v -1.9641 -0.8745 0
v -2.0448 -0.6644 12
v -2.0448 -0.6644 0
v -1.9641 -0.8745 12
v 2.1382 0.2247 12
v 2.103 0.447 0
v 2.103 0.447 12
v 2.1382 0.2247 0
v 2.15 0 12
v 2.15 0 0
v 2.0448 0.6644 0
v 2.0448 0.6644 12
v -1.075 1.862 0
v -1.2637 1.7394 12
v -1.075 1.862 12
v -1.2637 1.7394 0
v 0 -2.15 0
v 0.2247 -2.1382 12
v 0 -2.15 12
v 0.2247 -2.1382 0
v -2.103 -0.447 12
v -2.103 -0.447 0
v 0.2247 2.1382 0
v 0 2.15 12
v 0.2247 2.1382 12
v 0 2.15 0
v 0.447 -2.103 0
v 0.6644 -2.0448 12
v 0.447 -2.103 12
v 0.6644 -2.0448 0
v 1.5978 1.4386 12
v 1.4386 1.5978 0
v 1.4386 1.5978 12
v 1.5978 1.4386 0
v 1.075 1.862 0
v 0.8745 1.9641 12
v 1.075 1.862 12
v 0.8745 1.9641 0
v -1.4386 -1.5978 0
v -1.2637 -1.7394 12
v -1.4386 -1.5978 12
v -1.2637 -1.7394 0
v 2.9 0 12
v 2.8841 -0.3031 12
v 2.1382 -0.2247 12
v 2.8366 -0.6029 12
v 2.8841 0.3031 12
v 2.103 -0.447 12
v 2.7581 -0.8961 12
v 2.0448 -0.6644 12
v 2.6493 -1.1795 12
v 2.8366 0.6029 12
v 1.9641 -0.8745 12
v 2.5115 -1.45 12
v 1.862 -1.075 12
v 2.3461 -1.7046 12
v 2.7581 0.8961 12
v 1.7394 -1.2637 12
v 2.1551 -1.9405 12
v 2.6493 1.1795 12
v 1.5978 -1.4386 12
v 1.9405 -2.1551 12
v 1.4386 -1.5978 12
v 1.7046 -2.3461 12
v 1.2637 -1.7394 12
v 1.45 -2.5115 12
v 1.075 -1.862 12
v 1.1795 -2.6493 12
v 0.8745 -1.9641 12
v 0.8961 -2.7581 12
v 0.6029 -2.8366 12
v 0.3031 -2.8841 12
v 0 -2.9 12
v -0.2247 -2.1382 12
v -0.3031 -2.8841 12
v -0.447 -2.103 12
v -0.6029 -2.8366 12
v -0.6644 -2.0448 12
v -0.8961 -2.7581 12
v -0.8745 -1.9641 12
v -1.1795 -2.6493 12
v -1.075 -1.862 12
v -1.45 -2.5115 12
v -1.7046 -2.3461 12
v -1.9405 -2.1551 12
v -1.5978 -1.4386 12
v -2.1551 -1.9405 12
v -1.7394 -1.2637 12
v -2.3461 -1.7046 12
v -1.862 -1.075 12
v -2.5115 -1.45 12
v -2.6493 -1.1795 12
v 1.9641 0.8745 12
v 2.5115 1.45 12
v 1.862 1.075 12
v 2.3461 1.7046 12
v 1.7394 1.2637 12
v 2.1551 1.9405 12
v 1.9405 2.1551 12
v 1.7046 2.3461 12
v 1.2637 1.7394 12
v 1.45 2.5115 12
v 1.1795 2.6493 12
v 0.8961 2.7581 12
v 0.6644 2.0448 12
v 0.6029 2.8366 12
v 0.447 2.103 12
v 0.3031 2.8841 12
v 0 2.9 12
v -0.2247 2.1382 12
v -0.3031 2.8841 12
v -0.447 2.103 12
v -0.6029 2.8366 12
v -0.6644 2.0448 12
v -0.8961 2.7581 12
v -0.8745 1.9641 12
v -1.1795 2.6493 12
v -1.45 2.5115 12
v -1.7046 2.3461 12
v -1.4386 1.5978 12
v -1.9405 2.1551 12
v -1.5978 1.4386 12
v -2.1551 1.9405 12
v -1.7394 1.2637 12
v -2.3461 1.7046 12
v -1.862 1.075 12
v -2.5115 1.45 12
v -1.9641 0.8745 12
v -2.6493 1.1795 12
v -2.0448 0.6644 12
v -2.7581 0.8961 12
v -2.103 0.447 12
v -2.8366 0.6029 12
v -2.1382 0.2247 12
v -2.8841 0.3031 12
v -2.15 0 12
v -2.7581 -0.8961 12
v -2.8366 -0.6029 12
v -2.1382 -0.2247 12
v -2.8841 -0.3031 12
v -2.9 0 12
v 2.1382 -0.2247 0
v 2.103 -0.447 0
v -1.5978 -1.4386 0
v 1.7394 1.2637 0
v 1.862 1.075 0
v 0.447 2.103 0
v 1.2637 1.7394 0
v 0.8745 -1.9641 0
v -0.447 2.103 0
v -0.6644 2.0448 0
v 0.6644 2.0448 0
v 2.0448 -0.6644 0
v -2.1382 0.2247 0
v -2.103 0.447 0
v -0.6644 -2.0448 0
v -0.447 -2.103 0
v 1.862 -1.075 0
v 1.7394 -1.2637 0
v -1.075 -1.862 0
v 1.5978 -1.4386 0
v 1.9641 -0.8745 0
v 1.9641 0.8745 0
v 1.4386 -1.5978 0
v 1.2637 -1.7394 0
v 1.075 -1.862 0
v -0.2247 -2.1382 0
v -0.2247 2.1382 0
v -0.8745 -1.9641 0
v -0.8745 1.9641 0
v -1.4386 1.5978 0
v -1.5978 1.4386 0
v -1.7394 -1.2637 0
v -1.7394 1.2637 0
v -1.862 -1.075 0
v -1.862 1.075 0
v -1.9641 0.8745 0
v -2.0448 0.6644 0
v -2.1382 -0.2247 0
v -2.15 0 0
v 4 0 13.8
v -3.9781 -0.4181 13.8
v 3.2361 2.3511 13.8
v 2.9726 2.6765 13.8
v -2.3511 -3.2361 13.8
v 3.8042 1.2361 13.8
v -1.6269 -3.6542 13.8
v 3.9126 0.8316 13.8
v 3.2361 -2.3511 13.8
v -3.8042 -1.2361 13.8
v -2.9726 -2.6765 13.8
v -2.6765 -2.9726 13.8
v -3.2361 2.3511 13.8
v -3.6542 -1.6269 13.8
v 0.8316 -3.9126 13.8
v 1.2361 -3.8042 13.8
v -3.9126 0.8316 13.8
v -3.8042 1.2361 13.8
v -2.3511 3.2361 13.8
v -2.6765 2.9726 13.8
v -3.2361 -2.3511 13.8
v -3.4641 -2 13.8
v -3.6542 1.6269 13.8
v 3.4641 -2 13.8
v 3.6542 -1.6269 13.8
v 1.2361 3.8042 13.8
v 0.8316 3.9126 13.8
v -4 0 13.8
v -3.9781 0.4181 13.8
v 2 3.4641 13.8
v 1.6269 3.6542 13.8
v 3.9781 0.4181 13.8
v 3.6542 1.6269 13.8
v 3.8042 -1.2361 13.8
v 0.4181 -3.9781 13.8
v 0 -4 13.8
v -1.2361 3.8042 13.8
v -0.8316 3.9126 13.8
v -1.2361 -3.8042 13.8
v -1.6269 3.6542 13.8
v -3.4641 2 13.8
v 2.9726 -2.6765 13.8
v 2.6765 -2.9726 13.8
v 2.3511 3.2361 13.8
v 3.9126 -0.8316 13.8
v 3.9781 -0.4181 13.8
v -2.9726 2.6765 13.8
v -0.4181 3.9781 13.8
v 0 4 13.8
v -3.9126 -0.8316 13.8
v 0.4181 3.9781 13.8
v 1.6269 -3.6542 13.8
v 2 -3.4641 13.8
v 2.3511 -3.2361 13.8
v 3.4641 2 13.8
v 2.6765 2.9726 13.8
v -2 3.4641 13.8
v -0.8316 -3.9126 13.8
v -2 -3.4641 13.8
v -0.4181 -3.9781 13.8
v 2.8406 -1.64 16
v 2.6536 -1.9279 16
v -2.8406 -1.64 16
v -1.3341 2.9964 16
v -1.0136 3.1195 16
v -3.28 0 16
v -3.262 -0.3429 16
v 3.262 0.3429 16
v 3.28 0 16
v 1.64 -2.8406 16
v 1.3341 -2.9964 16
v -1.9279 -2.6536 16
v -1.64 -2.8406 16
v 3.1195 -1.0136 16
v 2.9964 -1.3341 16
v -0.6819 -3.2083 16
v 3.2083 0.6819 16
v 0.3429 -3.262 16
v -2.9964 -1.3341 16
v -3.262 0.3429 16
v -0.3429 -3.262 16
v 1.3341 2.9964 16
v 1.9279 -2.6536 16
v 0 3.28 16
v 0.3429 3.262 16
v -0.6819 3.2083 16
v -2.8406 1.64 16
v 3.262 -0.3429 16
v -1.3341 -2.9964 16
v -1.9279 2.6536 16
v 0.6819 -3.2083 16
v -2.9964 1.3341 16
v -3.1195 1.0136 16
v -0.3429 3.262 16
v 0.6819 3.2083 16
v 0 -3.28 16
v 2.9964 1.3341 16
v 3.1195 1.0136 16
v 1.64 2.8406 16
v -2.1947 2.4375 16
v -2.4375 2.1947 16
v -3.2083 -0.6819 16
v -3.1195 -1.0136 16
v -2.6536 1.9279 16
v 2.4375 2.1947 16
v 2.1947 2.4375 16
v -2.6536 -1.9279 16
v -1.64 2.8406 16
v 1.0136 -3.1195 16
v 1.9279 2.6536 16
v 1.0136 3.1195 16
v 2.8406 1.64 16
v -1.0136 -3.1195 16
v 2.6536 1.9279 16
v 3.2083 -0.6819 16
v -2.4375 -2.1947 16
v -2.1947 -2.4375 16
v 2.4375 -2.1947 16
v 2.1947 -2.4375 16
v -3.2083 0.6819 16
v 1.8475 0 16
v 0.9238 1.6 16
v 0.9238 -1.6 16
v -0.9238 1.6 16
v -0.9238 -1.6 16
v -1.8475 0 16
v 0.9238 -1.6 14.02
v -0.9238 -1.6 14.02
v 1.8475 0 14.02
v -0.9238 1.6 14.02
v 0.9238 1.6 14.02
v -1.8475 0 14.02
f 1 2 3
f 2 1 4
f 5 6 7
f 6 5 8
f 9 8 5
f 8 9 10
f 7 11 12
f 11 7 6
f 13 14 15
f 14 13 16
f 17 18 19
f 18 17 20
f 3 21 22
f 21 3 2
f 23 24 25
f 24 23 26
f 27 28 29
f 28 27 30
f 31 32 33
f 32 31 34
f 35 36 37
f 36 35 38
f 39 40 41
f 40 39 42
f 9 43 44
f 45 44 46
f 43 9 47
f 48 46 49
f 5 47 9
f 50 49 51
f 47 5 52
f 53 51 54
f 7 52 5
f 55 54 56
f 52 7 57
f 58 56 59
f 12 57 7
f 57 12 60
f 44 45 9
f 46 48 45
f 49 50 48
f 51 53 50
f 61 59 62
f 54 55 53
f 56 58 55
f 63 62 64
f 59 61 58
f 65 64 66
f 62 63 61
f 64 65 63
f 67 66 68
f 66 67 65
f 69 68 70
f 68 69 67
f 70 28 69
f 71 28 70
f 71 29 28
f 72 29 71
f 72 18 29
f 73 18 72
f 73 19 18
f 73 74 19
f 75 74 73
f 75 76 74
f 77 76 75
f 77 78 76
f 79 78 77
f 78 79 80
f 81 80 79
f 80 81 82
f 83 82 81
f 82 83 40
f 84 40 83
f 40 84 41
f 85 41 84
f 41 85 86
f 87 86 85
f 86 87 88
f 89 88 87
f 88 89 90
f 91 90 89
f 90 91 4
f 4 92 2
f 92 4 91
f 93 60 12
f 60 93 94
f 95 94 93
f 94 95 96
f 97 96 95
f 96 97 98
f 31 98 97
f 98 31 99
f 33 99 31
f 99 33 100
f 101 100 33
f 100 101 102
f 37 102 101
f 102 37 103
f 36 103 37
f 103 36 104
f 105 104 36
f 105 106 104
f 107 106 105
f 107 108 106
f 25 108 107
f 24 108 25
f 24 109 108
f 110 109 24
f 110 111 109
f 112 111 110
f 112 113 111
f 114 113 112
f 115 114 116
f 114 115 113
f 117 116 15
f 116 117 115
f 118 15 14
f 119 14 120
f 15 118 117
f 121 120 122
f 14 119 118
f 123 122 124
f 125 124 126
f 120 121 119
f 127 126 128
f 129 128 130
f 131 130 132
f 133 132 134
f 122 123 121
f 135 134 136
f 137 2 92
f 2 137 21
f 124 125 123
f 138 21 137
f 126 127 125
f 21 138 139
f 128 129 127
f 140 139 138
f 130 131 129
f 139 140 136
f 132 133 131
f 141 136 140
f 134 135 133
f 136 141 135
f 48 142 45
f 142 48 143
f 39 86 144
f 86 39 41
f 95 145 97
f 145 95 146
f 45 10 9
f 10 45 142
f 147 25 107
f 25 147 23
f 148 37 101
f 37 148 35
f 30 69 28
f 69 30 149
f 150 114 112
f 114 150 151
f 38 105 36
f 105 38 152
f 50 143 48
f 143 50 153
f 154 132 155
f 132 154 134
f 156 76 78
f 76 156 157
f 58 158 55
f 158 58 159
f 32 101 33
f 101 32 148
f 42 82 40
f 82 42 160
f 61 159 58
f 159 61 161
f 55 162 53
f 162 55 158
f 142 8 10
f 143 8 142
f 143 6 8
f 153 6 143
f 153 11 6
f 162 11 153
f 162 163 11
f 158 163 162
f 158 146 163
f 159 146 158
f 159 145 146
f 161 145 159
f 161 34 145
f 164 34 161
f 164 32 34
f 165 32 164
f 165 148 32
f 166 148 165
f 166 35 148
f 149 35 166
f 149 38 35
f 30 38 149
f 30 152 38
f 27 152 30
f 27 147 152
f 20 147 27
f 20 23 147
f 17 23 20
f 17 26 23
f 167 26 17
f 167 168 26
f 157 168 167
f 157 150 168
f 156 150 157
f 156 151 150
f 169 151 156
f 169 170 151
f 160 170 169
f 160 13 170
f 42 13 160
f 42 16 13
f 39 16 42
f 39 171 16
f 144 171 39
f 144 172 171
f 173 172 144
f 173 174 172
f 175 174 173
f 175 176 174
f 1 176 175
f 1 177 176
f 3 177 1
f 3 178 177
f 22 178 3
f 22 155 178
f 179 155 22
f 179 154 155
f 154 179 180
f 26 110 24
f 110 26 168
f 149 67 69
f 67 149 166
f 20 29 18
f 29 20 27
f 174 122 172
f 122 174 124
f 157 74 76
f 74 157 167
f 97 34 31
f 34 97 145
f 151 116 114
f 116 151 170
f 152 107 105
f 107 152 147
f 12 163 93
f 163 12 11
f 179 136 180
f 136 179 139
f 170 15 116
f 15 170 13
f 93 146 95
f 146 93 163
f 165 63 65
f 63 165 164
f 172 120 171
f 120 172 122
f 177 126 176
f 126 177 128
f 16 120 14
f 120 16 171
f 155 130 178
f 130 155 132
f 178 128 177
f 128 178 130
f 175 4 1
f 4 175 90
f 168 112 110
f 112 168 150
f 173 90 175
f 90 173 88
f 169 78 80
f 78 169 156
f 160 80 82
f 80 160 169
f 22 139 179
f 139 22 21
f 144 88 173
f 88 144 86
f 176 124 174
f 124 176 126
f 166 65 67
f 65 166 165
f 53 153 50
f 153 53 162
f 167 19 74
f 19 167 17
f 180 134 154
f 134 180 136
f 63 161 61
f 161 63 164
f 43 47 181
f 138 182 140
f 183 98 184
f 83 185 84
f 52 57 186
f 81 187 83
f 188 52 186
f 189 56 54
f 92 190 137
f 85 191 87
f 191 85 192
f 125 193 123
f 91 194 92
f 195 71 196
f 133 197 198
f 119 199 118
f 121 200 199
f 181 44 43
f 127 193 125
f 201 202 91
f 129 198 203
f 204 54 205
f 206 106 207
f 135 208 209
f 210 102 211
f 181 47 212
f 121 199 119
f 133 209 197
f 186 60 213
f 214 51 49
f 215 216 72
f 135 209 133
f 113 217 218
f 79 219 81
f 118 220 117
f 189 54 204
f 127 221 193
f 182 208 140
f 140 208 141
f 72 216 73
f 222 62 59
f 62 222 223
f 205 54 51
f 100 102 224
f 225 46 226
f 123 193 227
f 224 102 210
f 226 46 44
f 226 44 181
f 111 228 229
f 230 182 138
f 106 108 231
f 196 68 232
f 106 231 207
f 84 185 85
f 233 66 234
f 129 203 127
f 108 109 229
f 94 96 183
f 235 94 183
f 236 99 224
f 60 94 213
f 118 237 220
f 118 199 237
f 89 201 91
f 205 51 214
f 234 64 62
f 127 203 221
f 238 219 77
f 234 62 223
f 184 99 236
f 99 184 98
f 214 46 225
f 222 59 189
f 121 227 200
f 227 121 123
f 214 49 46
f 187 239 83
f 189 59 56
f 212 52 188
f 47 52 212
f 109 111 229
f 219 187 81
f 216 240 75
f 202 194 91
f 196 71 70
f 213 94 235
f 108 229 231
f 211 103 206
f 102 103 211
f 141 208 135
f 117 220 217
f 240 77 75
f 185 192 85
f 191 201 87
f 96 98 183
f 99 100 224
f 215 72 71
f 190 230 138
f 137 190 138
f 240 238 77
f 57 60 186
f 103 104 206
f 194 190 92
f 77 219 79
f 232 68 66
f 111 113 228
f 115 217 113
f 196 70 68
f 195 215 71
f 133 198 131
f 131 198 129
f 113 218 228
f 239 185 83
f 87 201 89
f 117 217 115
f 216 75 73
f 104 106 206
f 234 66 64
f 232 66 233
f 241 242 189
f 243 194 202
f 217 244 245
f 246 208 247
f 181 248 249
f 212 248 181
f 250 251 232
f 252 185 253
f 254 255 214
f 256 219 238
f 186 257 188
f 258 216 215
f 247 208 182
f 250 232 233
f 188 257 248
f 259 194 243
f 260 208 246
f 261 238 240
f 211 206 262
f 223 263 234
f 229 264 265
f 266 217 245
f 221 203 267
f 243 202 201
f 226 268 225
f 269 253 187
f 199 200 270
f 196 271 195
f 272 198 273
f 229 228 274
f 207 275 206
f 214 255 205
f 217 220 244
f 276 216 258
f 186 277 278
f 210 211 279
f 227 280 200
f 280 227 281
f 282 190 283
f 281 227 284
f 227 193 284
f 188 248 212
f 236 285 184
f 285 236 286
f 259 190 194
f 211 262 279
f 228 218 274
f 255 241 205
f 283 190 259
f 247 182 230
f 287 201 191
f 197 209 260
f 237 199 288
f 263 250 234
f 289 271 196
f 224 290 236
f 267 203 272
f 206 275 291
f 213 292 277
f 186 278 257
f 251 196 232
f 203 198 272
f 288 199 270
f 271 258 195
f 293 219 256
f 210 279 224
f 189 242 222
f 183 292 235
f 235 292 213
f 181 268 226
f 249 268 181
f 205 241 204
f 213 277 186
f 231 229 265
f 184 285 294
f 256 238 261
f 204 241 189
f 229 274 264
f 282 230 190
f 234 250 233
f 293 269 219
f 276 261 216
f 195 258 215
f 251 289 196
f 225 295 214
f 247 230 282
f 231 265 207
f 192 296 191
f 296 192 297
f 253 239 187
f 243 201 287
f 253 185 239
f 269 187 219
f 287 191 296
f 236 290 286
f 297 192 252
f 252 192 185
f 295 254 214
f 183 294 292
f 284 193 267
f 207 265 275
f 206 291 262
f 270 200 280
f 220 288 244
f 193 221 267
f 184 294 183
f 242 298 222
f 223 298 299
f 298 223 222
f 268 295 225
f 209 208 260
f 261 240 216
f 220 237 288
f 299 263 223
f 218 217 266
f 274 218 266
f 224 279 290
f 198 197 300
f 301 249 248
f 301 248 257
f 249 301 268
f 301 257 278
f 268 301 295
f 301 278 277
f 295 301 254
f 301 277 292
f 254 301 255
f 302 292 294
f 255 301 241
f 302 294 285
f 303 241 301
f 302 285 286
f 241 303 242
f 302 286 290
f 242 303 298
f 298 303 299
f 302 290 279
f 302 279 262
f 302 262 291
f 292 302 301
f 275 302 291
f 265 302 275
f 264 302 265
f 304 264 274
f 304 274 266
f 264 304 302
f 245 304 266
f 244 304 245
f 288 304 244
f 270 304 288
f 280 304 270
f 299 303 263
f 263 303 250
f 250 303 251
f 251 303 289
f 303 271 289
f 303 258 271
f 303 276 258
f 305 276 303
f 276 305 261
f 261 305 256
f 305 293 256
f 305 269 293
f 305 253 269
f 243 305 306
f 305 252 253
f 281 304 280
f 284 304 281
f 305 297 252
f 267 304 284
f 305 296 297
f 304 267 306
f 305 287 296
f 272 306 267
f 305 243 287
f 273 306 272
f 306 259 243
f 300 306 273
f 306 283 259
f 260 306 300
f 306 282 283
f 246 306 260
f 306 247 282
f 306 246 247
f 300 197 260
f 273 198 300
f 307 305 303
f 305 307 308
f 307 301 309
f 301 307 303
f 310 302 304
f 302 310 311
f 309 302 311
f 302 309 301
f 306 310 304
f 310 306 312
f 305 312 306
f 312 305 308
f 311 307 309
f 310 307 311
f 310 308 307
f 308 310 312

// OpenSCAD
// Low-profile button-head screw.
$fn = 60;
eps = 0.02;
shaft_d = 4.3;
head_d = 8;
head_h = 4;
shaft_l = 12;
socket_flat = head_d * 0.40;
difference() {
    union() {
        cylinder(d = shaft_d, h = shaft_l);
        translate([0, 0, shaft_l]) cylinder(d1 = shaft_d + 1.5, d2 = head_d, h = head_h * 0.45);
        translate([0, 0, shaft_l + head_h * 0.45]) cylinder(d1 = head_d, d2 = head_d * 0.82, h = head_h * 0.55);
    }
    translate([0, 0, shaft_l + head_h - head_h * 0.5 + eps])
        cylinder(d = socket_flat / cos(30), h = head_h * 0.5 + eps, $fn = 6);
}
